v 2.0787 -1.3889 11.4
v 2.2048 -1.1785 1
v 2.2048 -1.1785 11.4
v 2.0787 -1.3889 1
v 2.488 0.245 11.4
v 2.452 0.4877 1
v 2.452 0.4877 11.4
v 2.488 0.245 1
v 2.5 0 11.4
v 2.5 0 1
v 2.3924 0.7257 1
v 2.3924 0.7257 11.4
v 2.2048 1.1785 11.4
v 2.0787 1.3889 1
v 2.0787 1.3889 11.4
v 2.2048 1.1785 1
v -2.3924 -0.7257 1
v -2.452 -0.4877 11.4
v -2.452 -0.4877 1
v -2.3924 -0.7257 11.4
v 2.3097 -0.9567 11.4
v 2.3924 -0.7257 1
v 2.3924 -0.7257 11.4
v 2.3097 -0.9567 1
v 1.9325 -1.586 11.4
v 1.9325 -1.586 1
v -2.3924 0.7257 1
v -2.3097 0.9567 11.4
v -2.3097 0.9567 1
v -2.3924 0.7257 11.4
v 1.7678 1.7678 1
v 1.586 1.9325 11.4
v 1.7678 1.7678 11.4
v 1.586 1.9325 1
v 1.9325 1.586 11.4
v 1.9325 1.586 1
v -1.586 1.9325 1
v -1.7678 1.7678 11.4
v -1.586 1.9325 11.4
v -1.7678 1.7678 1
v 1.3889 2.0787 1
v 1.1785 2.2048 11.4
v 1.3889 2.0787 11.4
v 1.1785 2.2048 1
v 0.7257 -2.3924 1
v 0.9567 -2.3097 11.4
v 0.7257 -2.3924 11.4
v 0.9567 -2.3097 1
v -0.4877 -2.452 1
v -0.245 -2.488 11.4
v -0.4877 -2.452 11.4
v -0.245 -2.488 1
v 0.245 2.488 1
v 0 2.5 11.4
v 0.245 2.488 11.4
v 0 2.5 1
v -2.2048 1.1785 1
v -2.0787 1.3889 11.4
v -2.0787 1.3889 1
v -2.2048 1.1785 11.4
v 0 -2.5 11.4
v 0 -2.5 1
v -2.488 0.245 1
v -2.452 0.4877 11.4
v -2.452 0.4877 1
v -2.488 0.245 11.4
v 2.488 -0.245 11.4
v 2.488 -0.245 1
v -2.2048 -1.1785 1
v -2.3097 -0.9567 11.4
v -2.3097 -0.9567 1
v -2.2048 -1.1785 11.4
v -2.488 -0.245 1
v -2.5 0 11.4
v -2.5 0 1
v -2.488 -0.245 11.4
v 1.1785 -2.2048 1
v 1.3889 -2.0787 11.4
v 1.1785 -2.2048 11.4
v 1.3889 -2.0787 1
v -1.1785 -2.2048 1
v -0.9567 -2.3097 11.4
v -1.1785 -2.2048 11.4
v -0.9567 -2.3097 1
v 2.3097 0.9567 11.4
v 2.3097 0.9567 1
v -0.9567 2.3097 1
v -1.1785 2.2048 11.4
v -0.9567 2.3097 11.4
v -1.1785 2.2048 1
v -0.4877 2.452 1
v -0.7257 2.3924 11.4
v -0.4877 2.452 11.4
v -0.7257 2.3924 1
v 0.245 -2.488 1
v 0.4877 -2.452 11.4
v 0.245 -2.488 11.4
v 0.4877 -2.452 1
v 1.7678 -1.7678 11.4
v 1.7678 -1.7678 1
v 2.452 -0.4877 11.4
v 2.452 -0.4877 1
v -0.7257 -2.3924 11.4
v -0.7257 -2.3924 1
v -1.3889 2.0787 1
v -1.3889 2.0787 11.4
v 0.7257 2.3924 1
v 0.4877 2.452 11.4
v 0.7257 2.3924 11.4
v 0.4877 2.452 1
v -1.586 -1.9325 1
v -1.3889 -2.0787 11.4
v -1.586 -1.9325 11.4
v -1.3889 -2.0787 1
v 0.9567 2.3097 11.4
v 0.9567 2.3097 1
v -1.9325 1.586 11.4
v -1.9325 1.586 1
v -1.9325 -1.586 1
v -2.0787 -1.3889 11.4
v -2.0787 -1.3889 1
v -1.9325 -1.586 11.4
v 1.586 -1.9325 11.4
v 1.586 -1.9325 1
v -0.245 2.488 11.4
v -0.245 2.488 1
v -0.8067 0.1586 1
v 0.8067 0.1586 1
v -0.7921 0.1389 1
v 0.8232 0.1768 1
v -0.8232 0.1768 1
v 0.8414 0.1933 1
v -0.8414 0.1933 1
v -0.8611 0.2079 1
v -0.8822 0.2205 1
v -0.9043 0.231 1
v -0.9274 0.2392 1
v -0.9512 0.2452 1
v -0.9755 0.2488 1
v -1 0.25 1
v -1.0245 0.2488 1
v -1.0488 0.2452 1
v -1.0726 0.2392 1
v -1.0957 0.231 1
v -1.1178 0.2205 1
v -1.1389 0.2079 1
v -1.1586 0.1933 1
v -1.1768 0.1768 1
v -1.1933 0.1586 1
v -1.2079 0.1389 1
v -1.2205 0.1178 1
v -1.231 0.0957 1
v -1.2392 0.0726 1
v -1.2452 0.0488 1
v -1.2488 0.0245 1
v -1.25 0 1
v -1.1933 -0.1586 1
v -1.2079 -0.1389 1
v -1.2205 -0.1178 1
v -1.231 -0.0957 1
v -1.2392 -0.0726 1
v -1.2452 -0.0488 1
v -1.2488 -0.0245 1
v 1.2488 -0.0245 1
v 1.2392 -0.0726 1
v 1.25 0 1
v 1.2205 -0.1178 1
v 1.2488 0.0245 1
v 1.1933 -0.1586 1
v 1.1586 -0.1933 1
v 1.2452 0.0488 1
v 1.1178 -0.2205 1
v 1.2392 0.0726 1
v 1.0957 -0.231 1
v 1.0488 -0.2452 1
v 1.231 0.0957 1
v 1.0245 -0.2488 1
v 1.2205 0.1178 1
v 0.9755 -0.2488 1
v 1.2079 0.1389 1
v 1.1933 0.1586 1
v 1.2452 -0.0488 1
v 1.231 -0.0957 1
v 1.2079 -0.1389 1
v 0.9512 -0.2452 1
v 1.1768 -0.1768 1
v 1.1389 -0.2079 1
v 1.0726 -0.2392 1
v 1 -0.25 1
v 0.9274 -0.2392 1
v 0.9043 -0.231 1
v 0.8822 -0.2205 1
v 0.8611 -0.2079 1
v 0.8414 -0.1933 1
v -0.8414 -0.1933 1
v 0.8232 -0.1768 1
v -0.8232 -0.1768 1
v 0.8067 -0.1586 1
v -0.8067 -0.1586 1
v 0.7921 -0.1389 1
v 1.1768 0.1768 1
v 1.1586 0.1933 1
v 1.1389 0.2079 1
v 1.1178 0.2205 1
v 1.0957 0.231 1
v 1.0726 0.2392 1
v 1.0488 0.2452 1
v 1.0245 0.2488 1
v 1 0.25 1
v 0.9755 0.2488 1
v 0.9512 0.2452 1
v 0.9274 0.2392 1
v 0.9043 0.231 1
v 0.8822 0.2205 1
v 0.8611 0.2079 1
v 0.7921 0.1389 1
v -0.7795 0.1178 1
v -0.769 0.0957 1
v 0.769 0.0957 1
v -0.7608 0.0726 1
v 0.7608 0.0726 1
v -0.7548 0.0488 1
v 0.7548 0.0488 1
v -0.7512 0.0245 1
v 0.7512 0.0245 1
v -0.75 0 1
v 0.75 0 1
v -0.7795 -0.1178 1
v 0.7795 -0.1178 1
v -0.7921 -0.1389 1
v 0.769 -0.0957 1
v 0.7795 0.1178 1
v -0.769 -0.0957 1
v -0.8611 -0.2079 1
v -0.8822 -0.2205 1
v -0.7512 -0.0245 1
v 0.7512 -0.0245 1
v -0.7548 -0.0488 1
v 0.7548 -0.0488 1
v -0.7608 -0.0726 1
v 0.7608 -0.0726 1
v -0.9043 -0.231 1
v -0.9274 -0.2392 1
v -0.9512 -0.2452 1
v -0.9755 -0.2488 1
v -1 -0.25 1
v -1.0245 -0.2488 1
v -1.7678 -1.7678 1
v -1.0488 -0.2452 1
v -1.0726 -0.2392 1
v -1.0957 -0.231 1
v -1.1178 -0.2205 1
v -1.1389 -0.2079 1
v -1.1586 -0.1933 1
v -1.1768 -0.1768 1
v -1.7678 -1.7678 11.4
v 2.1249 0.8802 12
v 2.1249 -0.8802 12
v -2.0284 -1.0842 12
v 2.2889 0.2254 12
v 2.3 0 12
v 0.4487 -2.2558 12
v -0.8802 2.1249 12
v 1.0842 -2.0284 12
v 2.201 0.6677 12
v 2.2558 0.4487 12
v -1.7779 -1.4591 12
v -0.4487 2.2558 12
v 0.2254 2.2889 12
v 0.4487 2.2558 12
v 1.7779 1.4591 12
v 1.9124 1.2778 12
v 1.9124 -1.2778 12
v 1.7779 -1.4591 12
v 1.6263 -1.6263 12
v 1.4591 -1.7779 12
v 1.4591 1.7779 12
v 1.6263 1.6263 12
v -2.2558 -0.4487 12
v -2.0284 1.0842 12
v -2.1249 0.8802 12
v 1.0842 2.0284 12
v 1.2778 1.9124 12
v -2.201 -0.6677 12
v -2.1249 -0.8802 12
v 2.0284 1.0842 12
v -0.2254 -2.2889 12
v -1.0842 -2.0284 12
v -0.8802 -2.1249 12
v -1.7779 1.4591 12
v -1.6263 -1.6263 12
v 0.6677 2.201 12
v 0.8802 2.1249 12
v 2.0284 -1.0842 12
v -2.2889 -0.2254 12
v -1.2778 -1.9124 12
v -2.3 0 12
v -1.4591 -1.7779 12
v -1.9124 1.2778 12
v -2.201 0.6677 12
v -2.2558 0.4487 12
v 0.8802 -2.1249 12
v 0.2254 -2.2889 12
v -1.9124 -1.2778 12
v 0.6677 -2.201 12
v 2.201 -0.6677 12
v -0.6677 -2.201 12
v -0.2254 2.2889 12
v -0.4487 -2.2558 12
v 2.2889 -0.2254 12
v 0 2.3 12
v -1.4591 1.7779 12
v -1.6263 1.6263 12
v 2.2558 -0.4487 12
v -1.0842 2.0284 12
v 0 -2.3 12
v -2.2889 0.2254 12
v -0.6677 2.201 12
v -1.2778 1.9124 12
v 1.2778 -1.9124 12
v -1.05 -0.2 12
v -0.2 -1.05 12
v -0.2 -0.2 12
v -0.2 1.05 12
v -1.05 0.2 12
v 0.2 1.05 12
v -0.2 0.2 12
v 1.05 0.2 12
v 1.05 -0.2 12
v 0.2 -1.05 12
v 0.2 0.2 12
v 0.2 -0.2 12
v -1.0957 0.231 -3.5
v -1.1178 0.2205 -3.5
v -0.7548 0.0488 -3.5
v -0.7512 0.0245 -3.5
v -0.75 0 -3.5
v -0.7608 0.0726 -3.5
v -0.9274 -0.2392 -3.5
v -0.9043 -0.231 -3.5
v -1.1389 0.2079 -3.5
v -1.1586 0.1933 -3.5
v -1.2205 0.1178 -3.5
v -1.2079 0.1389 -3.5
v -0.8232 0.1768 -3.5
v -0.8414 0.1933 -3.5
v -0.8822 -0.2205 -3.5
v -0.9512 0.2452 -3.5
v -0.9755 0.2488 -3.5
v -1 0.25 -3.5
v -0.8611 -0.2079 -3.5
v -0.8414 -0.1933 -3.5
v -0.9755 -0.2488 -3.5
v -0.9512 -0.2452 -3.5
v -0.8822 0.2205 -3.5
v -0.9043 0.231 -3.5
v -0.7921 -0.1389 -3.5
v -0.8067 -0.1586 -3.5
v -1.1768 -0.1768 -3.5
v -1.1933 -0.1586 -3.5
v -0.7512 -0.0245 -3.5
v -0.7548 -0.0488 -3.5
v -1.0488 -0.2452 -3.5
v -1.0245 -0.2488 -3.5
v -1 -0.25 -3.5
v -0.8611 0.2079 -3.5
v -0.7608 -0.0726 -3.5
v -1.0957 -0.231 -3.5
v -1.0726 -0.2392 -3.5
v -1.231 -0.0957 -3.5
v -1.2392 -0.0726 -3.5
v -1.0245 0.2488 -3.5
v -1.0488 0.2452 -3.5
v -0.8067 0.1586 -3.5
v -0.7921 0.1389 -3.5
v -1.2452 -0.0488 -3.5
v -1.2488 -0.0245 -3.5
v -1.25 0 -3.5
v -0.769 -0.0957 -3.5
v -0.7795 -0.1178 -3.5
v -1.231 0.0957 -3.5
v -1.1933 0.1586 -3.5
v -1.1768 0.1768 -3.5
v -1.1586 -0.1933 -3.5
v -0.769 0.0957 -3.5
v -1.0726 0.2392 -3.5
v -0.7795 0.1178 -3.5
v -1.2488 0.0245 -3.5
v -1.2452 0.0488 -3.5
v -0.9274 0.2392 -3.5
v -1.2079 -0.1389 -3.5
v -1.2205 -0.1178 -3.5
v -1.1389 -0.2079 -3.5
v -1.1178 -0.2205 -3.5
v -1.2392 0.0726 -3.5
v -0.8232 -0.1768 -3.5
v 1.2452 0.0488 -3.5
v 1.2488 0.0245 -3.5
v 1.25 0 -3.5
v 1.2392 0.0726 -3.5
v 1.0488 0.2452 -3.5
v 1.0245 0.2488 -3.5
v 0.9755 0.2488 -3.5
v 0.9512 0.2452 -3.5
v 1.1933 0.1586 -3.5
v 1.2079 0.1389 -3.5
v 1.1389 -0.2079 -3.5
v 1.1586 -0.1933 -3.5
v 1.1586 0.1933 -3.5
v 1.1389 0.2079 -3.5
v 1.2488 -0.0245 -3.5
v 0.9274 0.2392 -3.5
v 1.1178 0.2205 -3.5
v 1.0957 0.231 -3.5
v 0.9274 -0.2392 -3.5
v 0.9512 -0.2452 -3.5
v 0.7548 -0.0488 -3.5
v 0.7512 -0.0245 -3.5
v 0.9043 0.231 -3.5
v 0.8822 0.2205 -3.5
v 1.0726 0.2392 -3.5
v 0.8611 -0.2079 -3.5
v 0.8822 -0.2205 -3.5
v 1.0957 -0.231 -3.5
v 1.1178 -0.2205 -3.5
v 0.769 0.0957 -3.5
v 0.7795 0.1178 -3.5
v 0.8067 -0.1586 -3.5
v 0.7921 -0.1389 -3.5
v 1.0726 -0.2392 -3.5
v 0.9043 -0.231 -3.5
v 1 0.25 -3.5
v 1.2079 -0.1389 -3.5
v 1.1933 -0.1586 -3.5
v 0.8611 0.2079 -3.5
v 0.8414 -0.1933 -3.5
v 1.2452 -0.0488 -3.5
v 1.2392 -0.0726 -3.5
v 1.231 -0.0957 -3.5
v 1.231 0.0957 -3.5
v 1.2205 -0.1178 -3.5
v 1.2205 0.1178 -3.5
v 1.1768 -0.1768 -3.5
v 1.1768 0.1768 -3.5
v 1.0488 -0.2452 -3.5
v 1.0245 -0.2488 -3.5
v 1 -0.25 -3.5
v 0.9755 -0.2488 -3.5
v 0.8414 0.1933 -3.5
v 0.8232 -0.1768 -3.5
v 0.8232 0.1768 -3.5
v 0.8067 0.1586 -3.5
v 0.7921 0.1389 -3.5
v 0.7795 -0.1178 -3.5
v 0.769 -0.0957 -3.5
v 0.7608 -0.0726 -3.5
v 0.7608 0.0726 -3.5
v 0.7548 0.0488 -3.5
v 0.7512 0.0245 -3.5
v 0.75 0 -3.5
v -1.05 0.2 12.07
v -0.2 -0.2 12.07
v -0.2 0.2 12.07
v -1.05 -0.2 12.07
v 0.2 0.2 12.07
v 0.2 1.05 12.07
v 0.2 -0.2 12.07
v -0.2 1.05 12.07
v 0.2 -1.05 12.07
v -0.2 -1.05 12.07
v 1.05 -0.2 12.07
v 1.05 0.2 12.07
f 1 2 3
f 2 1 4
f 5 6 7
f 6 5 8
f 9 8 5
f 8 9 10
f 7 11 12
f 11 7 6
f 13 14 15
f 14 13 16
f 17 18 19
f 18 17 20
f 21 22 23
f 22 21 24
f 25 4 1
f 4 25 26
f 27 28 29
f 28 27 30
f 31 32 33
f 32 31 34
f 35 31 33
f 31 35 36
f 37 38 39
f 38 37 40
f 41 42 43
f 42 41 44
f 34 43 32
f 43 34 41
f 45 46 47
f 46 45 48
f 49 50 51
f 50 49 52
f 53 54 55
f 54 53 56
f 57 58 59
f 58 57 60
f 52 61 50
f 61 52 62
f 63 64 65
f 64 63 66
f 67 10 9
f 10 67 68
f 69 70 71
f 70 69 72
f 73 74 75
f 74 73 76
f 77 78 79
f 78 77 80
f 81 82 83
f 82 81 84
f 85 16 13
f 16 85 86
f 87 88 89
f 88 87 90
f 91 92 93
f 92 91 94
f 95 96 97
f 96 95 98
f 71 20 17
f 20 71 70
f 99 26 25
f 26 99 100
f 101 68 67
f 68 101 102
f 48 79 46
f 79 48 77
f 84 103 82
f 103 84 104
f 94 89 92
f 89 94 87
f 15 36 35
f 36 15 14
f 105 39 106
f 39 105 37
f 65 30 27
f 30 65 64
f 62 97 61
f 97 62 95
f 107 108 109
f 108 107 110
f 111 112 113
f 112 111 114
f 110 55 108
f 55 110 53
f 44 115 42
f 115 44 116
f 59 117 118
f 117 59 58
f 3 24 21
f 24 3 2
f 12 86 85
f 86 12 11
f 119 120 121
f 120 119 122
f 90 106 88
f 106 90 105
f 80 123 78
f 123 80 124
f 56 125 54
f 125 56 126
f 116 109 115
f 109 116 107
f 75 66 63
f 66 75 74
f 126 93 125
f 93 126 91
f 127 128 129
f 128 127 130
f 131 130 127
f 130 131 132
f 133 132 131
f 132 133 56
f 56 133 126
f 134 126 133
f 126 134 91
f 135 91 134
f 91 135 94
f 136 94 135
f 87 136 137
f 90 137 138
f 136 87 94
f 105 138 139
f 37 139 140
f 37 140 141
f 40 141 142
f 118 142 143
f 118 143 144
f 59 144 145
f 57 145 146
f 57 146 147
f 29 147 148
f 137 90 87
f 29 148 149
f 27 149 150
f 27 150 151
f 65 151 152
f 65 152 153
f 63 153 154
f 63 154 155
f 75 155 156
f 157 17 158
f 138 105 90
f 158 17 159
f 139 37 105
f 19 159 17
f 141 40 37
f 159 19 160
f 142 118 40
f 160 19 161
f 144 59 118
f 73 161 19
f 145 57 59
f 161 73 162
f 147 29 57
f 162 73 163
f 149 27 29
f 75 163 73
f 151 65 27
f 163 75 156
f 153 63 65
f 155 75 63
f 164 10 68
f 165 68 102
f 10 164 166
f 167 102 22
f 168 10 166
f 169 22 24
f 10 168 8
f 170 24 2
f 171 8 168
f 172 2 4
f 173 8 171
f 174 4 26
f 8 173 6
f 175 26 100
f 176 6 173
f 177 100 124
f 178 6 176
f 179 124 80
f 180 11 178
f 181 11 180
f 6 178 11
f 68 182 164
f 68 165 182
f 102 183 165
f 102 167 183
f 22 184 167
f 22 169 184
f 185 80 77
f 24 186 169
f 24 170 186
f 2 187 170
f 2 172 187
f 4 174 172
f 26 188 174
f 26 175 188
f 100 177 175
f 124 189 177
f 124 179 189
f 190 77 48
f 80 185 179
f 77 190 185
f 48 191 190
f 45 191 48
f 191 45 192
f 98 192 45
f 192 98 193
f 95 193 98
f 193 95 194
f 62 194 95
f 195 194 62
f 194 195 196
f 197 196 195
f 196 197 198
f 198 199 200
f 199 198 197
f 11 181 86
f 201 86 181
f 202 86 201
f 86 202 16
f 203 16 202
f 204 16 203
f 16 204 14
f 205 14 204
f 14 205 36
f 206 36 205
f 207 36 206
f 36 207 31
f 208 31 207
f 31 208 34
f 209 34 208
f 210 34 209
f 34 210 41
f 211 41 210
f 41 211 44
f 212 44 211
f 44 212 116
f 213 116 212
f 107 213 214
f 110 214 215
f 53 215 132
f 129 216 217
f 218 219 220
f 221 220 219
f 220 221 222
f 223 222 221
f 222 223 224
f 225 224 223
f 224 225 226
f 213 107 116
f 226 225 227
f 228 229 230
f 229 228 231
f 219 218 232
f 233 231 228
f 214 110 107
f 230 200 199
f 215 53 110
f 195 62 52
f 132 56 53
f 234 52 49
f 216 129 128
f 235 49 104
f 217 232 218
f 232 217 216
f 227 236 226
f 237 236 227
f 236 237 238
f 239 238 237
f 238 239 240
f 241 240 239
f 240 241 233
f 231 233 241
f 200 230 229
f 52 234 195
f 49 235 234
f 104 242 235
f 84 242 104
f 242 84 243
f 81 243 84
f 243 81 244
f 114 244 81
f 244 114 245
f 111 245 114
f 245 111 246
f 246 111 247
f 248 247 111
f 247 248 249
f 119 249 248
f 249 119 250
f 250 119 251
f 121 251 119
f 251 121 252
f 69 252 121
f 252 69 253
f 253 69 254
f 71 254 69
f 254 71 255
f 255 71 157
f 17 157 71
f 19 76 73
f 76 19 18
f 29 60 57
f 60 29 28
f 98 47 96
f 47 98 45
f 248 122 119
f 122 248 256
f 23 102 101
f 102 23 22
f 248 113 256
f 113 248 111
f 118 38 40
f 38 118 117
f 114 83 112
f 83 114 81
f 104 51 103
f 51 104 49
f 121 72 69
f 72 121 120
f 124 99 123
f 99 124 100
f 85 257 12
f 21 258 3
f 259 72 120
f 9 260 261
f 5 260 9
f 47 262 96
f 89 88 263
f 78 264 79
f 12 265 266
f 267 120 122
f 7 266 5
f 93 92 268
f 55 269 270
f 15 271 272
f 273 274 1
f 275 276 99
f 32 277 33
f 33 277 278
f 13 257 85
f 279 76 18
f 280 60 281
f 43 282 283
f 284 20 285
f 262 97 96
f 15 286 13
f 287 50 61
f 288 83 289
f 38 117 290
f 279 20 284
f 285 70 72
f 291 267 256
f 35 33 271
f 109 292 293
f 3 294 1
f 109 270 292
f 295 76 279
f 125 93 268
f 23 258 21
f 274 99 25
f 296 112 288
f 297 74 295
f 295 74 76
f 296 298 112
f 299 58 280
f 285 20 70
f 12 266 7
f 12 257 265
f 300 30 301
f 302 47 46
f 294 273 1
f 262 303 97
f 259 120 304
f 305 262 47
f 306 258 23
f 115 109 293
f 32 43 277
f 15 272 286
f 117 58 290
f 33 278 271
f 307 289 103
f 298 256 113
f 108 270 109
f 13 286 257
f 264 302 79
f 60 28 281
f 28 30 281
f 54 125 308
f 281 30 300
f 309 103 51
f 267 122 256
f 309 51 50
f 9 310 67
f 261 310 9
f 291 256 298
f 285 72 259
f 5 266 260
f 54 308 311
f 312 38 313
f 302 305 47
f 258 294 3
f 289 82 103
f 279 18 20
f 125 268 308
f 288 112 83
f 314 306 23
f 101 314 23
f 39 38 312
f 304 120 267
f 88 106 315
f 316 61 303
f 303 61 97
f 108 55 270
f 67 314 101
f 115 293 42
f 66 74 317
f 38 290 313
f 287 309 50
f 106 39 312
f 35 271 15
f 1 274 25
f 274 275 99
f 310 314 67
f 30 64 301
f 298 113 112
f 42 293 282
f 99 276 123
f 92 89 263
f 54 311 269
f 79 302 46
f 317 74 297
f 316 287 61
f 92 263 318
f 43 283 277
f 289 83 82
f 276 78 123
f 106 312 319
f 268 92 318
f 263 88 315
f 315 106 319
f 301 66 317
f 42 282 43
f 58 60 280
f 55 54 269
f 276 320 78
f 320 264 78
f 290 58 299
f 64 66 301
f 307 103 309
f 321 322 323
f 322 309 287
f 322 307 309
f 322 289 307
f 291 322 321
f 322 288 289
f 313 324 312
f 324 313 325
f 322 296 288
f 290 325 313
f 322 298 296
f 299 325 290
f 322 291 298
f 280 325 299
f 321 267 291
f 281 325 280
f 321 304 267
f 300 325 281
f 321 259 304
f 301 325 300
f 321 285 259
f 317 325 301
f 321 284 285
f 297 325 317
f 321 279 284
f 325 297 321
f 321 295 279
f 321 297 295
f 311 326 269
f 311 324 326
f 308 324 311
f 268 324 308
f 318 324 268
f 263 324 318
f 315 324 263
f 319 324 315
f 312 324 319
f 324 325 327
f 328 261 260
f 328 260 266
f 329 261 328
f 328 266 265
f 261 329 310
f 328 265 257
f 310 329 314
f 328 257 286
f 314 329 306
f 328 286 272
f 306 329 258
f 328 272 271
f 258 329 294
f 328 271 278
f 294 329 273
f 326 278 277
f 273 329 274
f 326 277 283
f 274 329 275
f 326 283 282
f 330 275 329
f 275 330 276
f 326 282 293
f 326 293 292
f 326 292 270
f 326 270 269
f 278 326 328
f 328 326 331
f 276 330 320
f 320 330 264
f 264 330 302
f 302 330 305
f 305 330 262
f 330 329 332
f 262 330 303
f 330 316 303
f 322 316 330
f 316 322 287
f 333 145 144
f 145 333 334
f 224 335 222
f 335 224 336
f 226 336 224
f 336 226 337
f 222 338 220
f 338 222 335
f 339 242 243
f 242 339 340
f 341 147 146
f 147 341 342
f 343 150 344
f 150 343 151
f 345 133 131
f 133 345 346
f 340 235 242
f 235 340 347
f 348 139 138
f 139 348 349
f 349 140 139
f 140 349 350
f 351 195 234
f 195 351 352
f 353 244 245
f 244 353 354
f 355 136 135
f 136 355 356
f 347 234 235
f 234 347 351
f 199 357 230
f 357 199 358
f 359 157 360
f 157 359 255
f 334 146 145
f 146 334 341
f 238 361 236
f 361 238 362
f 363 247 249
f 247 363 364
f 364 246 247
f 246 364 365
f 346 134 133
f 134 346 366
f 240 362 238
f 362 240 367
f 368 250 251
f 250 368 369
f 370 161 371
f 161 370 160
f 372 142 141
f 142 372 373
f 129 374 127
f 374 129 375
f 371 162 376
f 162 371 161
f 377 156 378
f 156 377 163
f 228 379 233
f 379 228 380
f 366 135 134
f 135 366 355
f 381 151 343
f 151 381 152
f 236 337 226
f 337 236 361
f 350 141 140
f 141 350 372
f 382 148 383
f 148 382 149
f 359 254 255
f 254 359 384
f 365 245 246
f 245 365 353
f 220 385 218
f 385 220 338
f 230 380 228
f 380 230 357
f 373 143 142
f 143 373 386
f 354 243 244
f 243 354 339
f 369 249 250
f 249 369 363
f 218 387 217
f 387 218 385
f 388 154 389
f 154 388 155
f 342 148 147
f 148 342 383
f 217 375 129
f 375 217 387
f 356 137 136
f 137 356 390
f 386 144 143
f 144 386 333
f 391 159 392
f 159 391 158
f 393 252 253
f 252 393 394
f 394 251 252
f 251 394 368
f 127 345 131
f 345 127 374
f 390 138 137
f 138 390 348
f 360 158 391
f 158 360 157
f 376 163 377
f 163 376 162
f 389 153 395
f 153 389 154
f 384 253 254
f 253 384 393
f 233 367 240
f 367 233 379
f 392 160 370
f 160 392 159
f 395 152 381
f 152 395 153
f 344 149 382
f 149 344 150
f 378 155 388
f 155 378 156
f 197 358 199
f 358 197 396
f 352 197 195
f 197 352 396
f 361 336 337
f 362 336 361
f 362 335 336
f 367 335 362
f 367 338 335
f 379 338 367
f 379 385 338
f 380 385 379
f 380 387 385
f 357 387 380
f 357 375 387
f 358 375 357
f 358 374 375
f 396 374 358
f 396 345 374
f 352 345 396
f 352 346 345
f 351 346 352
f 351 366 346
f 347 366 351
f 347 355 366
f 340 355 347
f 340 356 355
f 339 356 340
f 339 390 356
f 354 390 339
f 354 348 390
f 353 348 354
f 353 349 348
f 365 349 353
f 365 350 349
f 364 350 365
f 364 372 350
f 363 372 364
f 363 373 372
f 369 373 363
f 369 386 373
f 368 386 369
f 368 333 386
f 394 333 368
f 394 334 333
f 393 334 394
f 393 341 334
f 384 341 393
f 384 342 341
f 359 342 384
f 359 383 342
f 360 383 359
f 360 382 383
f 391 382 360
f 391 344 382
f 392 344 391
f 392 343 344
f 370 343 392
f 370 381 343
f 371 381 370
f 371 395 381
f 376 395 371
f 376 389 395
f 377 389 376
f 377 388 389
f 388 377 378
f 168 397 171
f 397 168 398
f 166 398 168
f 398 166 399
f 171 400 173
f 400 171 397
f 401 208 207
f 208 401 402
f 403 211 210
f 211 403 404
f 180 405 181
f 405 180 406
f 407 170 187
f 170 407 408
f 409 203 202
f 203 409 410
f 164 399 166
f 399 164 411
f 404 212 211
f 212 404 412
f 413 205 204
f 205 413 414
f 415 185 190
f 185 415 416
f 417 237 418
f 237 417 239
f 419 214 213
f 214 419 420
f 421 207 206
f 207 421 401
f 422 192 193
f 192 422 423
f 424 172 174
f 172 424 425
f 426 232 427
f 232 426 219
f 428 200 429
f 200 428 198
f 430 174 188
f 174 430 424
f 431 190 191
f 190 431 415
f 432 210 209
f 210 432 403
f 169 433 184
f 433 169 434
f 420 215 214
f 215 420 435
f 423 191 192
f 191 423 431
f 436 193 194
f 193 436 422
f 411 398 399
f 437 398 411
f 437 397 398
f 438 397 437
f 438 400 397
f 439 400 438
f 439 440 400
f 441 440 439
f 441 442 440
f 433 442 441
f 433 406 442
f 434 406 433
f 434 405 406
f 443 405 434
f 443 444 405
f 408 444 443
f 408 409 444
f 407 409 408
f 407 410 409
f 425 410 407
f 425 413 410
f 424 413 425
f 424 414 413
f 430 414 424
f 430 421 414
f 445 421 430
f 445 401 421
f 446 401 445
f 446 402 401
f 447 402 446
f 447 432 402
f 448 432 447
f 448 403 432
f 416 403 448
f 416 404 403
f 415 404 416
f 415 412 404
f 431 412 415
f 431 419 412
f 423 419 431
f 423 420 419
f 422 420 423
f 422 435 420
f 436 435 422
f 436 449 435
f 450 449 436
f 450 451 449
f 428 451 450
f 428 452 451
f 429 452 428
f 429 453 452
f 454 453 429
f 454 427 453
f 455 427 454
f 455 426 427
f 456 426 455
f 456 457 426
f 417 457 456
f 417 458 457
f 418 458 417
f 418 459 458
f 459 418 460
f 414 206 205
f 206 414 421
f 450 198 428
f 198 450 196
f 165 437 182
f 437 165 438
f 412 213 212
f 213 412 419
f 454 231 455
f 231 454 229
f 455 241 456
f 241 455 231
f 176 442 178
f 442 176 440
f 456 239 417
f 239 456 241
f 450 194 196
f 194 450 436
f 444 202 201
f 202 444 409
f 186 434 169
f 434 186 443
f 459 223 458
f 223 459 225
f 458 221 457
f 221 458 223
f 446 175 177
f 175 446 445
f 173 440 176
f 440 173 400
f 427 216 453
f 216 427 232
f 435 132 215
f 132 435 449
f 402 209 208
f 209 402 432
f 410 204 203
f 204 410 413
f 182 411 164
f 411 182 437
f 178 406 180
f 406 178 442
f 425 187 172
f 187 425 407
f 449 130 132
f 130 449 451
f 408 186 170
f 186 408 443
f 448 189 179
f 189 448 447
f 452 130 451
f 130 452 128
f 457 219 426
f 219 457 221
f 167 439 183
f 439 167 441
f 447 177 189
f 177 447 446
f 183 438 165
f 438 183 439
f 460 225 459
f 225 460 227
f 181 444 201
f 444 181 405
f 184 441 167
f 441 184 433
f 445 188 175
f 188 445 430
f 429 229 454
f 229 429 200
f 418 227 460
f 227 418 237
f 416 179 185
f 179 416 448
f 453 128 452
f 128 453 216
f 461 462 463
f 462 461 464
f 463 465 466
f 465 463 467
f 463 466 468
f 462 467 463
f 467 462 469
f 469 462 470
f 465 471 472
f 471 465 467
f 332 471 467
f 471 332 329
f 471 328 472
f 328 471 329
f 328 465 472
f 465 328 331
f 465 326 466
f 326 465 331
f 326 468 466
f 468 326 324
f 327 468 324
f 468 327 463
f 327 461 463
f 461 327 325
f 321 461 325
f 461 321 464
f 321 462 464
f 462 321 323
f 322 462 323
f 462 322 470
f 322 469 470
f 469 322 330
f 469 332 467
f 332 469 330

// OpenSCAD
$fn = 64;

body_diameter = 5;
body_height = 11;
lead_spacing = 2;
lead_diameter = 0.5;
lead_length_below = 3.5;
body_lift = 1;
lead_stub = 1;
top_chamfer = 0.6;

module lead(x) {
    color([0.75, 0.75, 0.75])
    translate([x, 0, -lead_length_below])
        cylinder(h = lead_length_below + body_lift + lead_stub, d = lead_diameter);
}

module capacitor_body() {
    color([0.16, 0.18, 0.19])
    union() {
        translate([0, 0, body_lift])
            cylinder(h = body_height - top_chamfer, d = body_diameter);
        translate([0, 0, body_lift + body_height - top_chamfer])
            cylinder(h = top_chamfer, d1 = body_diameter, d2 = body_diameter * 0.92);
    }
}

module top_vent() {
    color([0.78, 0.78, 0.78])
    translate([0, 0, body_lift + body_height - 0.05])
    linear_extrude(height = 0.12)
    union() {
        square([body_diameter * 0.42, body_diameter * 0.08], center = true);
        square([body_diameter * 0.08, body_diameter * 0.42], center = true);
    }
}

lead(-lead_spacing / 2);
lead( lead_spacing / 2);
capacitor_body();
top_vent();
